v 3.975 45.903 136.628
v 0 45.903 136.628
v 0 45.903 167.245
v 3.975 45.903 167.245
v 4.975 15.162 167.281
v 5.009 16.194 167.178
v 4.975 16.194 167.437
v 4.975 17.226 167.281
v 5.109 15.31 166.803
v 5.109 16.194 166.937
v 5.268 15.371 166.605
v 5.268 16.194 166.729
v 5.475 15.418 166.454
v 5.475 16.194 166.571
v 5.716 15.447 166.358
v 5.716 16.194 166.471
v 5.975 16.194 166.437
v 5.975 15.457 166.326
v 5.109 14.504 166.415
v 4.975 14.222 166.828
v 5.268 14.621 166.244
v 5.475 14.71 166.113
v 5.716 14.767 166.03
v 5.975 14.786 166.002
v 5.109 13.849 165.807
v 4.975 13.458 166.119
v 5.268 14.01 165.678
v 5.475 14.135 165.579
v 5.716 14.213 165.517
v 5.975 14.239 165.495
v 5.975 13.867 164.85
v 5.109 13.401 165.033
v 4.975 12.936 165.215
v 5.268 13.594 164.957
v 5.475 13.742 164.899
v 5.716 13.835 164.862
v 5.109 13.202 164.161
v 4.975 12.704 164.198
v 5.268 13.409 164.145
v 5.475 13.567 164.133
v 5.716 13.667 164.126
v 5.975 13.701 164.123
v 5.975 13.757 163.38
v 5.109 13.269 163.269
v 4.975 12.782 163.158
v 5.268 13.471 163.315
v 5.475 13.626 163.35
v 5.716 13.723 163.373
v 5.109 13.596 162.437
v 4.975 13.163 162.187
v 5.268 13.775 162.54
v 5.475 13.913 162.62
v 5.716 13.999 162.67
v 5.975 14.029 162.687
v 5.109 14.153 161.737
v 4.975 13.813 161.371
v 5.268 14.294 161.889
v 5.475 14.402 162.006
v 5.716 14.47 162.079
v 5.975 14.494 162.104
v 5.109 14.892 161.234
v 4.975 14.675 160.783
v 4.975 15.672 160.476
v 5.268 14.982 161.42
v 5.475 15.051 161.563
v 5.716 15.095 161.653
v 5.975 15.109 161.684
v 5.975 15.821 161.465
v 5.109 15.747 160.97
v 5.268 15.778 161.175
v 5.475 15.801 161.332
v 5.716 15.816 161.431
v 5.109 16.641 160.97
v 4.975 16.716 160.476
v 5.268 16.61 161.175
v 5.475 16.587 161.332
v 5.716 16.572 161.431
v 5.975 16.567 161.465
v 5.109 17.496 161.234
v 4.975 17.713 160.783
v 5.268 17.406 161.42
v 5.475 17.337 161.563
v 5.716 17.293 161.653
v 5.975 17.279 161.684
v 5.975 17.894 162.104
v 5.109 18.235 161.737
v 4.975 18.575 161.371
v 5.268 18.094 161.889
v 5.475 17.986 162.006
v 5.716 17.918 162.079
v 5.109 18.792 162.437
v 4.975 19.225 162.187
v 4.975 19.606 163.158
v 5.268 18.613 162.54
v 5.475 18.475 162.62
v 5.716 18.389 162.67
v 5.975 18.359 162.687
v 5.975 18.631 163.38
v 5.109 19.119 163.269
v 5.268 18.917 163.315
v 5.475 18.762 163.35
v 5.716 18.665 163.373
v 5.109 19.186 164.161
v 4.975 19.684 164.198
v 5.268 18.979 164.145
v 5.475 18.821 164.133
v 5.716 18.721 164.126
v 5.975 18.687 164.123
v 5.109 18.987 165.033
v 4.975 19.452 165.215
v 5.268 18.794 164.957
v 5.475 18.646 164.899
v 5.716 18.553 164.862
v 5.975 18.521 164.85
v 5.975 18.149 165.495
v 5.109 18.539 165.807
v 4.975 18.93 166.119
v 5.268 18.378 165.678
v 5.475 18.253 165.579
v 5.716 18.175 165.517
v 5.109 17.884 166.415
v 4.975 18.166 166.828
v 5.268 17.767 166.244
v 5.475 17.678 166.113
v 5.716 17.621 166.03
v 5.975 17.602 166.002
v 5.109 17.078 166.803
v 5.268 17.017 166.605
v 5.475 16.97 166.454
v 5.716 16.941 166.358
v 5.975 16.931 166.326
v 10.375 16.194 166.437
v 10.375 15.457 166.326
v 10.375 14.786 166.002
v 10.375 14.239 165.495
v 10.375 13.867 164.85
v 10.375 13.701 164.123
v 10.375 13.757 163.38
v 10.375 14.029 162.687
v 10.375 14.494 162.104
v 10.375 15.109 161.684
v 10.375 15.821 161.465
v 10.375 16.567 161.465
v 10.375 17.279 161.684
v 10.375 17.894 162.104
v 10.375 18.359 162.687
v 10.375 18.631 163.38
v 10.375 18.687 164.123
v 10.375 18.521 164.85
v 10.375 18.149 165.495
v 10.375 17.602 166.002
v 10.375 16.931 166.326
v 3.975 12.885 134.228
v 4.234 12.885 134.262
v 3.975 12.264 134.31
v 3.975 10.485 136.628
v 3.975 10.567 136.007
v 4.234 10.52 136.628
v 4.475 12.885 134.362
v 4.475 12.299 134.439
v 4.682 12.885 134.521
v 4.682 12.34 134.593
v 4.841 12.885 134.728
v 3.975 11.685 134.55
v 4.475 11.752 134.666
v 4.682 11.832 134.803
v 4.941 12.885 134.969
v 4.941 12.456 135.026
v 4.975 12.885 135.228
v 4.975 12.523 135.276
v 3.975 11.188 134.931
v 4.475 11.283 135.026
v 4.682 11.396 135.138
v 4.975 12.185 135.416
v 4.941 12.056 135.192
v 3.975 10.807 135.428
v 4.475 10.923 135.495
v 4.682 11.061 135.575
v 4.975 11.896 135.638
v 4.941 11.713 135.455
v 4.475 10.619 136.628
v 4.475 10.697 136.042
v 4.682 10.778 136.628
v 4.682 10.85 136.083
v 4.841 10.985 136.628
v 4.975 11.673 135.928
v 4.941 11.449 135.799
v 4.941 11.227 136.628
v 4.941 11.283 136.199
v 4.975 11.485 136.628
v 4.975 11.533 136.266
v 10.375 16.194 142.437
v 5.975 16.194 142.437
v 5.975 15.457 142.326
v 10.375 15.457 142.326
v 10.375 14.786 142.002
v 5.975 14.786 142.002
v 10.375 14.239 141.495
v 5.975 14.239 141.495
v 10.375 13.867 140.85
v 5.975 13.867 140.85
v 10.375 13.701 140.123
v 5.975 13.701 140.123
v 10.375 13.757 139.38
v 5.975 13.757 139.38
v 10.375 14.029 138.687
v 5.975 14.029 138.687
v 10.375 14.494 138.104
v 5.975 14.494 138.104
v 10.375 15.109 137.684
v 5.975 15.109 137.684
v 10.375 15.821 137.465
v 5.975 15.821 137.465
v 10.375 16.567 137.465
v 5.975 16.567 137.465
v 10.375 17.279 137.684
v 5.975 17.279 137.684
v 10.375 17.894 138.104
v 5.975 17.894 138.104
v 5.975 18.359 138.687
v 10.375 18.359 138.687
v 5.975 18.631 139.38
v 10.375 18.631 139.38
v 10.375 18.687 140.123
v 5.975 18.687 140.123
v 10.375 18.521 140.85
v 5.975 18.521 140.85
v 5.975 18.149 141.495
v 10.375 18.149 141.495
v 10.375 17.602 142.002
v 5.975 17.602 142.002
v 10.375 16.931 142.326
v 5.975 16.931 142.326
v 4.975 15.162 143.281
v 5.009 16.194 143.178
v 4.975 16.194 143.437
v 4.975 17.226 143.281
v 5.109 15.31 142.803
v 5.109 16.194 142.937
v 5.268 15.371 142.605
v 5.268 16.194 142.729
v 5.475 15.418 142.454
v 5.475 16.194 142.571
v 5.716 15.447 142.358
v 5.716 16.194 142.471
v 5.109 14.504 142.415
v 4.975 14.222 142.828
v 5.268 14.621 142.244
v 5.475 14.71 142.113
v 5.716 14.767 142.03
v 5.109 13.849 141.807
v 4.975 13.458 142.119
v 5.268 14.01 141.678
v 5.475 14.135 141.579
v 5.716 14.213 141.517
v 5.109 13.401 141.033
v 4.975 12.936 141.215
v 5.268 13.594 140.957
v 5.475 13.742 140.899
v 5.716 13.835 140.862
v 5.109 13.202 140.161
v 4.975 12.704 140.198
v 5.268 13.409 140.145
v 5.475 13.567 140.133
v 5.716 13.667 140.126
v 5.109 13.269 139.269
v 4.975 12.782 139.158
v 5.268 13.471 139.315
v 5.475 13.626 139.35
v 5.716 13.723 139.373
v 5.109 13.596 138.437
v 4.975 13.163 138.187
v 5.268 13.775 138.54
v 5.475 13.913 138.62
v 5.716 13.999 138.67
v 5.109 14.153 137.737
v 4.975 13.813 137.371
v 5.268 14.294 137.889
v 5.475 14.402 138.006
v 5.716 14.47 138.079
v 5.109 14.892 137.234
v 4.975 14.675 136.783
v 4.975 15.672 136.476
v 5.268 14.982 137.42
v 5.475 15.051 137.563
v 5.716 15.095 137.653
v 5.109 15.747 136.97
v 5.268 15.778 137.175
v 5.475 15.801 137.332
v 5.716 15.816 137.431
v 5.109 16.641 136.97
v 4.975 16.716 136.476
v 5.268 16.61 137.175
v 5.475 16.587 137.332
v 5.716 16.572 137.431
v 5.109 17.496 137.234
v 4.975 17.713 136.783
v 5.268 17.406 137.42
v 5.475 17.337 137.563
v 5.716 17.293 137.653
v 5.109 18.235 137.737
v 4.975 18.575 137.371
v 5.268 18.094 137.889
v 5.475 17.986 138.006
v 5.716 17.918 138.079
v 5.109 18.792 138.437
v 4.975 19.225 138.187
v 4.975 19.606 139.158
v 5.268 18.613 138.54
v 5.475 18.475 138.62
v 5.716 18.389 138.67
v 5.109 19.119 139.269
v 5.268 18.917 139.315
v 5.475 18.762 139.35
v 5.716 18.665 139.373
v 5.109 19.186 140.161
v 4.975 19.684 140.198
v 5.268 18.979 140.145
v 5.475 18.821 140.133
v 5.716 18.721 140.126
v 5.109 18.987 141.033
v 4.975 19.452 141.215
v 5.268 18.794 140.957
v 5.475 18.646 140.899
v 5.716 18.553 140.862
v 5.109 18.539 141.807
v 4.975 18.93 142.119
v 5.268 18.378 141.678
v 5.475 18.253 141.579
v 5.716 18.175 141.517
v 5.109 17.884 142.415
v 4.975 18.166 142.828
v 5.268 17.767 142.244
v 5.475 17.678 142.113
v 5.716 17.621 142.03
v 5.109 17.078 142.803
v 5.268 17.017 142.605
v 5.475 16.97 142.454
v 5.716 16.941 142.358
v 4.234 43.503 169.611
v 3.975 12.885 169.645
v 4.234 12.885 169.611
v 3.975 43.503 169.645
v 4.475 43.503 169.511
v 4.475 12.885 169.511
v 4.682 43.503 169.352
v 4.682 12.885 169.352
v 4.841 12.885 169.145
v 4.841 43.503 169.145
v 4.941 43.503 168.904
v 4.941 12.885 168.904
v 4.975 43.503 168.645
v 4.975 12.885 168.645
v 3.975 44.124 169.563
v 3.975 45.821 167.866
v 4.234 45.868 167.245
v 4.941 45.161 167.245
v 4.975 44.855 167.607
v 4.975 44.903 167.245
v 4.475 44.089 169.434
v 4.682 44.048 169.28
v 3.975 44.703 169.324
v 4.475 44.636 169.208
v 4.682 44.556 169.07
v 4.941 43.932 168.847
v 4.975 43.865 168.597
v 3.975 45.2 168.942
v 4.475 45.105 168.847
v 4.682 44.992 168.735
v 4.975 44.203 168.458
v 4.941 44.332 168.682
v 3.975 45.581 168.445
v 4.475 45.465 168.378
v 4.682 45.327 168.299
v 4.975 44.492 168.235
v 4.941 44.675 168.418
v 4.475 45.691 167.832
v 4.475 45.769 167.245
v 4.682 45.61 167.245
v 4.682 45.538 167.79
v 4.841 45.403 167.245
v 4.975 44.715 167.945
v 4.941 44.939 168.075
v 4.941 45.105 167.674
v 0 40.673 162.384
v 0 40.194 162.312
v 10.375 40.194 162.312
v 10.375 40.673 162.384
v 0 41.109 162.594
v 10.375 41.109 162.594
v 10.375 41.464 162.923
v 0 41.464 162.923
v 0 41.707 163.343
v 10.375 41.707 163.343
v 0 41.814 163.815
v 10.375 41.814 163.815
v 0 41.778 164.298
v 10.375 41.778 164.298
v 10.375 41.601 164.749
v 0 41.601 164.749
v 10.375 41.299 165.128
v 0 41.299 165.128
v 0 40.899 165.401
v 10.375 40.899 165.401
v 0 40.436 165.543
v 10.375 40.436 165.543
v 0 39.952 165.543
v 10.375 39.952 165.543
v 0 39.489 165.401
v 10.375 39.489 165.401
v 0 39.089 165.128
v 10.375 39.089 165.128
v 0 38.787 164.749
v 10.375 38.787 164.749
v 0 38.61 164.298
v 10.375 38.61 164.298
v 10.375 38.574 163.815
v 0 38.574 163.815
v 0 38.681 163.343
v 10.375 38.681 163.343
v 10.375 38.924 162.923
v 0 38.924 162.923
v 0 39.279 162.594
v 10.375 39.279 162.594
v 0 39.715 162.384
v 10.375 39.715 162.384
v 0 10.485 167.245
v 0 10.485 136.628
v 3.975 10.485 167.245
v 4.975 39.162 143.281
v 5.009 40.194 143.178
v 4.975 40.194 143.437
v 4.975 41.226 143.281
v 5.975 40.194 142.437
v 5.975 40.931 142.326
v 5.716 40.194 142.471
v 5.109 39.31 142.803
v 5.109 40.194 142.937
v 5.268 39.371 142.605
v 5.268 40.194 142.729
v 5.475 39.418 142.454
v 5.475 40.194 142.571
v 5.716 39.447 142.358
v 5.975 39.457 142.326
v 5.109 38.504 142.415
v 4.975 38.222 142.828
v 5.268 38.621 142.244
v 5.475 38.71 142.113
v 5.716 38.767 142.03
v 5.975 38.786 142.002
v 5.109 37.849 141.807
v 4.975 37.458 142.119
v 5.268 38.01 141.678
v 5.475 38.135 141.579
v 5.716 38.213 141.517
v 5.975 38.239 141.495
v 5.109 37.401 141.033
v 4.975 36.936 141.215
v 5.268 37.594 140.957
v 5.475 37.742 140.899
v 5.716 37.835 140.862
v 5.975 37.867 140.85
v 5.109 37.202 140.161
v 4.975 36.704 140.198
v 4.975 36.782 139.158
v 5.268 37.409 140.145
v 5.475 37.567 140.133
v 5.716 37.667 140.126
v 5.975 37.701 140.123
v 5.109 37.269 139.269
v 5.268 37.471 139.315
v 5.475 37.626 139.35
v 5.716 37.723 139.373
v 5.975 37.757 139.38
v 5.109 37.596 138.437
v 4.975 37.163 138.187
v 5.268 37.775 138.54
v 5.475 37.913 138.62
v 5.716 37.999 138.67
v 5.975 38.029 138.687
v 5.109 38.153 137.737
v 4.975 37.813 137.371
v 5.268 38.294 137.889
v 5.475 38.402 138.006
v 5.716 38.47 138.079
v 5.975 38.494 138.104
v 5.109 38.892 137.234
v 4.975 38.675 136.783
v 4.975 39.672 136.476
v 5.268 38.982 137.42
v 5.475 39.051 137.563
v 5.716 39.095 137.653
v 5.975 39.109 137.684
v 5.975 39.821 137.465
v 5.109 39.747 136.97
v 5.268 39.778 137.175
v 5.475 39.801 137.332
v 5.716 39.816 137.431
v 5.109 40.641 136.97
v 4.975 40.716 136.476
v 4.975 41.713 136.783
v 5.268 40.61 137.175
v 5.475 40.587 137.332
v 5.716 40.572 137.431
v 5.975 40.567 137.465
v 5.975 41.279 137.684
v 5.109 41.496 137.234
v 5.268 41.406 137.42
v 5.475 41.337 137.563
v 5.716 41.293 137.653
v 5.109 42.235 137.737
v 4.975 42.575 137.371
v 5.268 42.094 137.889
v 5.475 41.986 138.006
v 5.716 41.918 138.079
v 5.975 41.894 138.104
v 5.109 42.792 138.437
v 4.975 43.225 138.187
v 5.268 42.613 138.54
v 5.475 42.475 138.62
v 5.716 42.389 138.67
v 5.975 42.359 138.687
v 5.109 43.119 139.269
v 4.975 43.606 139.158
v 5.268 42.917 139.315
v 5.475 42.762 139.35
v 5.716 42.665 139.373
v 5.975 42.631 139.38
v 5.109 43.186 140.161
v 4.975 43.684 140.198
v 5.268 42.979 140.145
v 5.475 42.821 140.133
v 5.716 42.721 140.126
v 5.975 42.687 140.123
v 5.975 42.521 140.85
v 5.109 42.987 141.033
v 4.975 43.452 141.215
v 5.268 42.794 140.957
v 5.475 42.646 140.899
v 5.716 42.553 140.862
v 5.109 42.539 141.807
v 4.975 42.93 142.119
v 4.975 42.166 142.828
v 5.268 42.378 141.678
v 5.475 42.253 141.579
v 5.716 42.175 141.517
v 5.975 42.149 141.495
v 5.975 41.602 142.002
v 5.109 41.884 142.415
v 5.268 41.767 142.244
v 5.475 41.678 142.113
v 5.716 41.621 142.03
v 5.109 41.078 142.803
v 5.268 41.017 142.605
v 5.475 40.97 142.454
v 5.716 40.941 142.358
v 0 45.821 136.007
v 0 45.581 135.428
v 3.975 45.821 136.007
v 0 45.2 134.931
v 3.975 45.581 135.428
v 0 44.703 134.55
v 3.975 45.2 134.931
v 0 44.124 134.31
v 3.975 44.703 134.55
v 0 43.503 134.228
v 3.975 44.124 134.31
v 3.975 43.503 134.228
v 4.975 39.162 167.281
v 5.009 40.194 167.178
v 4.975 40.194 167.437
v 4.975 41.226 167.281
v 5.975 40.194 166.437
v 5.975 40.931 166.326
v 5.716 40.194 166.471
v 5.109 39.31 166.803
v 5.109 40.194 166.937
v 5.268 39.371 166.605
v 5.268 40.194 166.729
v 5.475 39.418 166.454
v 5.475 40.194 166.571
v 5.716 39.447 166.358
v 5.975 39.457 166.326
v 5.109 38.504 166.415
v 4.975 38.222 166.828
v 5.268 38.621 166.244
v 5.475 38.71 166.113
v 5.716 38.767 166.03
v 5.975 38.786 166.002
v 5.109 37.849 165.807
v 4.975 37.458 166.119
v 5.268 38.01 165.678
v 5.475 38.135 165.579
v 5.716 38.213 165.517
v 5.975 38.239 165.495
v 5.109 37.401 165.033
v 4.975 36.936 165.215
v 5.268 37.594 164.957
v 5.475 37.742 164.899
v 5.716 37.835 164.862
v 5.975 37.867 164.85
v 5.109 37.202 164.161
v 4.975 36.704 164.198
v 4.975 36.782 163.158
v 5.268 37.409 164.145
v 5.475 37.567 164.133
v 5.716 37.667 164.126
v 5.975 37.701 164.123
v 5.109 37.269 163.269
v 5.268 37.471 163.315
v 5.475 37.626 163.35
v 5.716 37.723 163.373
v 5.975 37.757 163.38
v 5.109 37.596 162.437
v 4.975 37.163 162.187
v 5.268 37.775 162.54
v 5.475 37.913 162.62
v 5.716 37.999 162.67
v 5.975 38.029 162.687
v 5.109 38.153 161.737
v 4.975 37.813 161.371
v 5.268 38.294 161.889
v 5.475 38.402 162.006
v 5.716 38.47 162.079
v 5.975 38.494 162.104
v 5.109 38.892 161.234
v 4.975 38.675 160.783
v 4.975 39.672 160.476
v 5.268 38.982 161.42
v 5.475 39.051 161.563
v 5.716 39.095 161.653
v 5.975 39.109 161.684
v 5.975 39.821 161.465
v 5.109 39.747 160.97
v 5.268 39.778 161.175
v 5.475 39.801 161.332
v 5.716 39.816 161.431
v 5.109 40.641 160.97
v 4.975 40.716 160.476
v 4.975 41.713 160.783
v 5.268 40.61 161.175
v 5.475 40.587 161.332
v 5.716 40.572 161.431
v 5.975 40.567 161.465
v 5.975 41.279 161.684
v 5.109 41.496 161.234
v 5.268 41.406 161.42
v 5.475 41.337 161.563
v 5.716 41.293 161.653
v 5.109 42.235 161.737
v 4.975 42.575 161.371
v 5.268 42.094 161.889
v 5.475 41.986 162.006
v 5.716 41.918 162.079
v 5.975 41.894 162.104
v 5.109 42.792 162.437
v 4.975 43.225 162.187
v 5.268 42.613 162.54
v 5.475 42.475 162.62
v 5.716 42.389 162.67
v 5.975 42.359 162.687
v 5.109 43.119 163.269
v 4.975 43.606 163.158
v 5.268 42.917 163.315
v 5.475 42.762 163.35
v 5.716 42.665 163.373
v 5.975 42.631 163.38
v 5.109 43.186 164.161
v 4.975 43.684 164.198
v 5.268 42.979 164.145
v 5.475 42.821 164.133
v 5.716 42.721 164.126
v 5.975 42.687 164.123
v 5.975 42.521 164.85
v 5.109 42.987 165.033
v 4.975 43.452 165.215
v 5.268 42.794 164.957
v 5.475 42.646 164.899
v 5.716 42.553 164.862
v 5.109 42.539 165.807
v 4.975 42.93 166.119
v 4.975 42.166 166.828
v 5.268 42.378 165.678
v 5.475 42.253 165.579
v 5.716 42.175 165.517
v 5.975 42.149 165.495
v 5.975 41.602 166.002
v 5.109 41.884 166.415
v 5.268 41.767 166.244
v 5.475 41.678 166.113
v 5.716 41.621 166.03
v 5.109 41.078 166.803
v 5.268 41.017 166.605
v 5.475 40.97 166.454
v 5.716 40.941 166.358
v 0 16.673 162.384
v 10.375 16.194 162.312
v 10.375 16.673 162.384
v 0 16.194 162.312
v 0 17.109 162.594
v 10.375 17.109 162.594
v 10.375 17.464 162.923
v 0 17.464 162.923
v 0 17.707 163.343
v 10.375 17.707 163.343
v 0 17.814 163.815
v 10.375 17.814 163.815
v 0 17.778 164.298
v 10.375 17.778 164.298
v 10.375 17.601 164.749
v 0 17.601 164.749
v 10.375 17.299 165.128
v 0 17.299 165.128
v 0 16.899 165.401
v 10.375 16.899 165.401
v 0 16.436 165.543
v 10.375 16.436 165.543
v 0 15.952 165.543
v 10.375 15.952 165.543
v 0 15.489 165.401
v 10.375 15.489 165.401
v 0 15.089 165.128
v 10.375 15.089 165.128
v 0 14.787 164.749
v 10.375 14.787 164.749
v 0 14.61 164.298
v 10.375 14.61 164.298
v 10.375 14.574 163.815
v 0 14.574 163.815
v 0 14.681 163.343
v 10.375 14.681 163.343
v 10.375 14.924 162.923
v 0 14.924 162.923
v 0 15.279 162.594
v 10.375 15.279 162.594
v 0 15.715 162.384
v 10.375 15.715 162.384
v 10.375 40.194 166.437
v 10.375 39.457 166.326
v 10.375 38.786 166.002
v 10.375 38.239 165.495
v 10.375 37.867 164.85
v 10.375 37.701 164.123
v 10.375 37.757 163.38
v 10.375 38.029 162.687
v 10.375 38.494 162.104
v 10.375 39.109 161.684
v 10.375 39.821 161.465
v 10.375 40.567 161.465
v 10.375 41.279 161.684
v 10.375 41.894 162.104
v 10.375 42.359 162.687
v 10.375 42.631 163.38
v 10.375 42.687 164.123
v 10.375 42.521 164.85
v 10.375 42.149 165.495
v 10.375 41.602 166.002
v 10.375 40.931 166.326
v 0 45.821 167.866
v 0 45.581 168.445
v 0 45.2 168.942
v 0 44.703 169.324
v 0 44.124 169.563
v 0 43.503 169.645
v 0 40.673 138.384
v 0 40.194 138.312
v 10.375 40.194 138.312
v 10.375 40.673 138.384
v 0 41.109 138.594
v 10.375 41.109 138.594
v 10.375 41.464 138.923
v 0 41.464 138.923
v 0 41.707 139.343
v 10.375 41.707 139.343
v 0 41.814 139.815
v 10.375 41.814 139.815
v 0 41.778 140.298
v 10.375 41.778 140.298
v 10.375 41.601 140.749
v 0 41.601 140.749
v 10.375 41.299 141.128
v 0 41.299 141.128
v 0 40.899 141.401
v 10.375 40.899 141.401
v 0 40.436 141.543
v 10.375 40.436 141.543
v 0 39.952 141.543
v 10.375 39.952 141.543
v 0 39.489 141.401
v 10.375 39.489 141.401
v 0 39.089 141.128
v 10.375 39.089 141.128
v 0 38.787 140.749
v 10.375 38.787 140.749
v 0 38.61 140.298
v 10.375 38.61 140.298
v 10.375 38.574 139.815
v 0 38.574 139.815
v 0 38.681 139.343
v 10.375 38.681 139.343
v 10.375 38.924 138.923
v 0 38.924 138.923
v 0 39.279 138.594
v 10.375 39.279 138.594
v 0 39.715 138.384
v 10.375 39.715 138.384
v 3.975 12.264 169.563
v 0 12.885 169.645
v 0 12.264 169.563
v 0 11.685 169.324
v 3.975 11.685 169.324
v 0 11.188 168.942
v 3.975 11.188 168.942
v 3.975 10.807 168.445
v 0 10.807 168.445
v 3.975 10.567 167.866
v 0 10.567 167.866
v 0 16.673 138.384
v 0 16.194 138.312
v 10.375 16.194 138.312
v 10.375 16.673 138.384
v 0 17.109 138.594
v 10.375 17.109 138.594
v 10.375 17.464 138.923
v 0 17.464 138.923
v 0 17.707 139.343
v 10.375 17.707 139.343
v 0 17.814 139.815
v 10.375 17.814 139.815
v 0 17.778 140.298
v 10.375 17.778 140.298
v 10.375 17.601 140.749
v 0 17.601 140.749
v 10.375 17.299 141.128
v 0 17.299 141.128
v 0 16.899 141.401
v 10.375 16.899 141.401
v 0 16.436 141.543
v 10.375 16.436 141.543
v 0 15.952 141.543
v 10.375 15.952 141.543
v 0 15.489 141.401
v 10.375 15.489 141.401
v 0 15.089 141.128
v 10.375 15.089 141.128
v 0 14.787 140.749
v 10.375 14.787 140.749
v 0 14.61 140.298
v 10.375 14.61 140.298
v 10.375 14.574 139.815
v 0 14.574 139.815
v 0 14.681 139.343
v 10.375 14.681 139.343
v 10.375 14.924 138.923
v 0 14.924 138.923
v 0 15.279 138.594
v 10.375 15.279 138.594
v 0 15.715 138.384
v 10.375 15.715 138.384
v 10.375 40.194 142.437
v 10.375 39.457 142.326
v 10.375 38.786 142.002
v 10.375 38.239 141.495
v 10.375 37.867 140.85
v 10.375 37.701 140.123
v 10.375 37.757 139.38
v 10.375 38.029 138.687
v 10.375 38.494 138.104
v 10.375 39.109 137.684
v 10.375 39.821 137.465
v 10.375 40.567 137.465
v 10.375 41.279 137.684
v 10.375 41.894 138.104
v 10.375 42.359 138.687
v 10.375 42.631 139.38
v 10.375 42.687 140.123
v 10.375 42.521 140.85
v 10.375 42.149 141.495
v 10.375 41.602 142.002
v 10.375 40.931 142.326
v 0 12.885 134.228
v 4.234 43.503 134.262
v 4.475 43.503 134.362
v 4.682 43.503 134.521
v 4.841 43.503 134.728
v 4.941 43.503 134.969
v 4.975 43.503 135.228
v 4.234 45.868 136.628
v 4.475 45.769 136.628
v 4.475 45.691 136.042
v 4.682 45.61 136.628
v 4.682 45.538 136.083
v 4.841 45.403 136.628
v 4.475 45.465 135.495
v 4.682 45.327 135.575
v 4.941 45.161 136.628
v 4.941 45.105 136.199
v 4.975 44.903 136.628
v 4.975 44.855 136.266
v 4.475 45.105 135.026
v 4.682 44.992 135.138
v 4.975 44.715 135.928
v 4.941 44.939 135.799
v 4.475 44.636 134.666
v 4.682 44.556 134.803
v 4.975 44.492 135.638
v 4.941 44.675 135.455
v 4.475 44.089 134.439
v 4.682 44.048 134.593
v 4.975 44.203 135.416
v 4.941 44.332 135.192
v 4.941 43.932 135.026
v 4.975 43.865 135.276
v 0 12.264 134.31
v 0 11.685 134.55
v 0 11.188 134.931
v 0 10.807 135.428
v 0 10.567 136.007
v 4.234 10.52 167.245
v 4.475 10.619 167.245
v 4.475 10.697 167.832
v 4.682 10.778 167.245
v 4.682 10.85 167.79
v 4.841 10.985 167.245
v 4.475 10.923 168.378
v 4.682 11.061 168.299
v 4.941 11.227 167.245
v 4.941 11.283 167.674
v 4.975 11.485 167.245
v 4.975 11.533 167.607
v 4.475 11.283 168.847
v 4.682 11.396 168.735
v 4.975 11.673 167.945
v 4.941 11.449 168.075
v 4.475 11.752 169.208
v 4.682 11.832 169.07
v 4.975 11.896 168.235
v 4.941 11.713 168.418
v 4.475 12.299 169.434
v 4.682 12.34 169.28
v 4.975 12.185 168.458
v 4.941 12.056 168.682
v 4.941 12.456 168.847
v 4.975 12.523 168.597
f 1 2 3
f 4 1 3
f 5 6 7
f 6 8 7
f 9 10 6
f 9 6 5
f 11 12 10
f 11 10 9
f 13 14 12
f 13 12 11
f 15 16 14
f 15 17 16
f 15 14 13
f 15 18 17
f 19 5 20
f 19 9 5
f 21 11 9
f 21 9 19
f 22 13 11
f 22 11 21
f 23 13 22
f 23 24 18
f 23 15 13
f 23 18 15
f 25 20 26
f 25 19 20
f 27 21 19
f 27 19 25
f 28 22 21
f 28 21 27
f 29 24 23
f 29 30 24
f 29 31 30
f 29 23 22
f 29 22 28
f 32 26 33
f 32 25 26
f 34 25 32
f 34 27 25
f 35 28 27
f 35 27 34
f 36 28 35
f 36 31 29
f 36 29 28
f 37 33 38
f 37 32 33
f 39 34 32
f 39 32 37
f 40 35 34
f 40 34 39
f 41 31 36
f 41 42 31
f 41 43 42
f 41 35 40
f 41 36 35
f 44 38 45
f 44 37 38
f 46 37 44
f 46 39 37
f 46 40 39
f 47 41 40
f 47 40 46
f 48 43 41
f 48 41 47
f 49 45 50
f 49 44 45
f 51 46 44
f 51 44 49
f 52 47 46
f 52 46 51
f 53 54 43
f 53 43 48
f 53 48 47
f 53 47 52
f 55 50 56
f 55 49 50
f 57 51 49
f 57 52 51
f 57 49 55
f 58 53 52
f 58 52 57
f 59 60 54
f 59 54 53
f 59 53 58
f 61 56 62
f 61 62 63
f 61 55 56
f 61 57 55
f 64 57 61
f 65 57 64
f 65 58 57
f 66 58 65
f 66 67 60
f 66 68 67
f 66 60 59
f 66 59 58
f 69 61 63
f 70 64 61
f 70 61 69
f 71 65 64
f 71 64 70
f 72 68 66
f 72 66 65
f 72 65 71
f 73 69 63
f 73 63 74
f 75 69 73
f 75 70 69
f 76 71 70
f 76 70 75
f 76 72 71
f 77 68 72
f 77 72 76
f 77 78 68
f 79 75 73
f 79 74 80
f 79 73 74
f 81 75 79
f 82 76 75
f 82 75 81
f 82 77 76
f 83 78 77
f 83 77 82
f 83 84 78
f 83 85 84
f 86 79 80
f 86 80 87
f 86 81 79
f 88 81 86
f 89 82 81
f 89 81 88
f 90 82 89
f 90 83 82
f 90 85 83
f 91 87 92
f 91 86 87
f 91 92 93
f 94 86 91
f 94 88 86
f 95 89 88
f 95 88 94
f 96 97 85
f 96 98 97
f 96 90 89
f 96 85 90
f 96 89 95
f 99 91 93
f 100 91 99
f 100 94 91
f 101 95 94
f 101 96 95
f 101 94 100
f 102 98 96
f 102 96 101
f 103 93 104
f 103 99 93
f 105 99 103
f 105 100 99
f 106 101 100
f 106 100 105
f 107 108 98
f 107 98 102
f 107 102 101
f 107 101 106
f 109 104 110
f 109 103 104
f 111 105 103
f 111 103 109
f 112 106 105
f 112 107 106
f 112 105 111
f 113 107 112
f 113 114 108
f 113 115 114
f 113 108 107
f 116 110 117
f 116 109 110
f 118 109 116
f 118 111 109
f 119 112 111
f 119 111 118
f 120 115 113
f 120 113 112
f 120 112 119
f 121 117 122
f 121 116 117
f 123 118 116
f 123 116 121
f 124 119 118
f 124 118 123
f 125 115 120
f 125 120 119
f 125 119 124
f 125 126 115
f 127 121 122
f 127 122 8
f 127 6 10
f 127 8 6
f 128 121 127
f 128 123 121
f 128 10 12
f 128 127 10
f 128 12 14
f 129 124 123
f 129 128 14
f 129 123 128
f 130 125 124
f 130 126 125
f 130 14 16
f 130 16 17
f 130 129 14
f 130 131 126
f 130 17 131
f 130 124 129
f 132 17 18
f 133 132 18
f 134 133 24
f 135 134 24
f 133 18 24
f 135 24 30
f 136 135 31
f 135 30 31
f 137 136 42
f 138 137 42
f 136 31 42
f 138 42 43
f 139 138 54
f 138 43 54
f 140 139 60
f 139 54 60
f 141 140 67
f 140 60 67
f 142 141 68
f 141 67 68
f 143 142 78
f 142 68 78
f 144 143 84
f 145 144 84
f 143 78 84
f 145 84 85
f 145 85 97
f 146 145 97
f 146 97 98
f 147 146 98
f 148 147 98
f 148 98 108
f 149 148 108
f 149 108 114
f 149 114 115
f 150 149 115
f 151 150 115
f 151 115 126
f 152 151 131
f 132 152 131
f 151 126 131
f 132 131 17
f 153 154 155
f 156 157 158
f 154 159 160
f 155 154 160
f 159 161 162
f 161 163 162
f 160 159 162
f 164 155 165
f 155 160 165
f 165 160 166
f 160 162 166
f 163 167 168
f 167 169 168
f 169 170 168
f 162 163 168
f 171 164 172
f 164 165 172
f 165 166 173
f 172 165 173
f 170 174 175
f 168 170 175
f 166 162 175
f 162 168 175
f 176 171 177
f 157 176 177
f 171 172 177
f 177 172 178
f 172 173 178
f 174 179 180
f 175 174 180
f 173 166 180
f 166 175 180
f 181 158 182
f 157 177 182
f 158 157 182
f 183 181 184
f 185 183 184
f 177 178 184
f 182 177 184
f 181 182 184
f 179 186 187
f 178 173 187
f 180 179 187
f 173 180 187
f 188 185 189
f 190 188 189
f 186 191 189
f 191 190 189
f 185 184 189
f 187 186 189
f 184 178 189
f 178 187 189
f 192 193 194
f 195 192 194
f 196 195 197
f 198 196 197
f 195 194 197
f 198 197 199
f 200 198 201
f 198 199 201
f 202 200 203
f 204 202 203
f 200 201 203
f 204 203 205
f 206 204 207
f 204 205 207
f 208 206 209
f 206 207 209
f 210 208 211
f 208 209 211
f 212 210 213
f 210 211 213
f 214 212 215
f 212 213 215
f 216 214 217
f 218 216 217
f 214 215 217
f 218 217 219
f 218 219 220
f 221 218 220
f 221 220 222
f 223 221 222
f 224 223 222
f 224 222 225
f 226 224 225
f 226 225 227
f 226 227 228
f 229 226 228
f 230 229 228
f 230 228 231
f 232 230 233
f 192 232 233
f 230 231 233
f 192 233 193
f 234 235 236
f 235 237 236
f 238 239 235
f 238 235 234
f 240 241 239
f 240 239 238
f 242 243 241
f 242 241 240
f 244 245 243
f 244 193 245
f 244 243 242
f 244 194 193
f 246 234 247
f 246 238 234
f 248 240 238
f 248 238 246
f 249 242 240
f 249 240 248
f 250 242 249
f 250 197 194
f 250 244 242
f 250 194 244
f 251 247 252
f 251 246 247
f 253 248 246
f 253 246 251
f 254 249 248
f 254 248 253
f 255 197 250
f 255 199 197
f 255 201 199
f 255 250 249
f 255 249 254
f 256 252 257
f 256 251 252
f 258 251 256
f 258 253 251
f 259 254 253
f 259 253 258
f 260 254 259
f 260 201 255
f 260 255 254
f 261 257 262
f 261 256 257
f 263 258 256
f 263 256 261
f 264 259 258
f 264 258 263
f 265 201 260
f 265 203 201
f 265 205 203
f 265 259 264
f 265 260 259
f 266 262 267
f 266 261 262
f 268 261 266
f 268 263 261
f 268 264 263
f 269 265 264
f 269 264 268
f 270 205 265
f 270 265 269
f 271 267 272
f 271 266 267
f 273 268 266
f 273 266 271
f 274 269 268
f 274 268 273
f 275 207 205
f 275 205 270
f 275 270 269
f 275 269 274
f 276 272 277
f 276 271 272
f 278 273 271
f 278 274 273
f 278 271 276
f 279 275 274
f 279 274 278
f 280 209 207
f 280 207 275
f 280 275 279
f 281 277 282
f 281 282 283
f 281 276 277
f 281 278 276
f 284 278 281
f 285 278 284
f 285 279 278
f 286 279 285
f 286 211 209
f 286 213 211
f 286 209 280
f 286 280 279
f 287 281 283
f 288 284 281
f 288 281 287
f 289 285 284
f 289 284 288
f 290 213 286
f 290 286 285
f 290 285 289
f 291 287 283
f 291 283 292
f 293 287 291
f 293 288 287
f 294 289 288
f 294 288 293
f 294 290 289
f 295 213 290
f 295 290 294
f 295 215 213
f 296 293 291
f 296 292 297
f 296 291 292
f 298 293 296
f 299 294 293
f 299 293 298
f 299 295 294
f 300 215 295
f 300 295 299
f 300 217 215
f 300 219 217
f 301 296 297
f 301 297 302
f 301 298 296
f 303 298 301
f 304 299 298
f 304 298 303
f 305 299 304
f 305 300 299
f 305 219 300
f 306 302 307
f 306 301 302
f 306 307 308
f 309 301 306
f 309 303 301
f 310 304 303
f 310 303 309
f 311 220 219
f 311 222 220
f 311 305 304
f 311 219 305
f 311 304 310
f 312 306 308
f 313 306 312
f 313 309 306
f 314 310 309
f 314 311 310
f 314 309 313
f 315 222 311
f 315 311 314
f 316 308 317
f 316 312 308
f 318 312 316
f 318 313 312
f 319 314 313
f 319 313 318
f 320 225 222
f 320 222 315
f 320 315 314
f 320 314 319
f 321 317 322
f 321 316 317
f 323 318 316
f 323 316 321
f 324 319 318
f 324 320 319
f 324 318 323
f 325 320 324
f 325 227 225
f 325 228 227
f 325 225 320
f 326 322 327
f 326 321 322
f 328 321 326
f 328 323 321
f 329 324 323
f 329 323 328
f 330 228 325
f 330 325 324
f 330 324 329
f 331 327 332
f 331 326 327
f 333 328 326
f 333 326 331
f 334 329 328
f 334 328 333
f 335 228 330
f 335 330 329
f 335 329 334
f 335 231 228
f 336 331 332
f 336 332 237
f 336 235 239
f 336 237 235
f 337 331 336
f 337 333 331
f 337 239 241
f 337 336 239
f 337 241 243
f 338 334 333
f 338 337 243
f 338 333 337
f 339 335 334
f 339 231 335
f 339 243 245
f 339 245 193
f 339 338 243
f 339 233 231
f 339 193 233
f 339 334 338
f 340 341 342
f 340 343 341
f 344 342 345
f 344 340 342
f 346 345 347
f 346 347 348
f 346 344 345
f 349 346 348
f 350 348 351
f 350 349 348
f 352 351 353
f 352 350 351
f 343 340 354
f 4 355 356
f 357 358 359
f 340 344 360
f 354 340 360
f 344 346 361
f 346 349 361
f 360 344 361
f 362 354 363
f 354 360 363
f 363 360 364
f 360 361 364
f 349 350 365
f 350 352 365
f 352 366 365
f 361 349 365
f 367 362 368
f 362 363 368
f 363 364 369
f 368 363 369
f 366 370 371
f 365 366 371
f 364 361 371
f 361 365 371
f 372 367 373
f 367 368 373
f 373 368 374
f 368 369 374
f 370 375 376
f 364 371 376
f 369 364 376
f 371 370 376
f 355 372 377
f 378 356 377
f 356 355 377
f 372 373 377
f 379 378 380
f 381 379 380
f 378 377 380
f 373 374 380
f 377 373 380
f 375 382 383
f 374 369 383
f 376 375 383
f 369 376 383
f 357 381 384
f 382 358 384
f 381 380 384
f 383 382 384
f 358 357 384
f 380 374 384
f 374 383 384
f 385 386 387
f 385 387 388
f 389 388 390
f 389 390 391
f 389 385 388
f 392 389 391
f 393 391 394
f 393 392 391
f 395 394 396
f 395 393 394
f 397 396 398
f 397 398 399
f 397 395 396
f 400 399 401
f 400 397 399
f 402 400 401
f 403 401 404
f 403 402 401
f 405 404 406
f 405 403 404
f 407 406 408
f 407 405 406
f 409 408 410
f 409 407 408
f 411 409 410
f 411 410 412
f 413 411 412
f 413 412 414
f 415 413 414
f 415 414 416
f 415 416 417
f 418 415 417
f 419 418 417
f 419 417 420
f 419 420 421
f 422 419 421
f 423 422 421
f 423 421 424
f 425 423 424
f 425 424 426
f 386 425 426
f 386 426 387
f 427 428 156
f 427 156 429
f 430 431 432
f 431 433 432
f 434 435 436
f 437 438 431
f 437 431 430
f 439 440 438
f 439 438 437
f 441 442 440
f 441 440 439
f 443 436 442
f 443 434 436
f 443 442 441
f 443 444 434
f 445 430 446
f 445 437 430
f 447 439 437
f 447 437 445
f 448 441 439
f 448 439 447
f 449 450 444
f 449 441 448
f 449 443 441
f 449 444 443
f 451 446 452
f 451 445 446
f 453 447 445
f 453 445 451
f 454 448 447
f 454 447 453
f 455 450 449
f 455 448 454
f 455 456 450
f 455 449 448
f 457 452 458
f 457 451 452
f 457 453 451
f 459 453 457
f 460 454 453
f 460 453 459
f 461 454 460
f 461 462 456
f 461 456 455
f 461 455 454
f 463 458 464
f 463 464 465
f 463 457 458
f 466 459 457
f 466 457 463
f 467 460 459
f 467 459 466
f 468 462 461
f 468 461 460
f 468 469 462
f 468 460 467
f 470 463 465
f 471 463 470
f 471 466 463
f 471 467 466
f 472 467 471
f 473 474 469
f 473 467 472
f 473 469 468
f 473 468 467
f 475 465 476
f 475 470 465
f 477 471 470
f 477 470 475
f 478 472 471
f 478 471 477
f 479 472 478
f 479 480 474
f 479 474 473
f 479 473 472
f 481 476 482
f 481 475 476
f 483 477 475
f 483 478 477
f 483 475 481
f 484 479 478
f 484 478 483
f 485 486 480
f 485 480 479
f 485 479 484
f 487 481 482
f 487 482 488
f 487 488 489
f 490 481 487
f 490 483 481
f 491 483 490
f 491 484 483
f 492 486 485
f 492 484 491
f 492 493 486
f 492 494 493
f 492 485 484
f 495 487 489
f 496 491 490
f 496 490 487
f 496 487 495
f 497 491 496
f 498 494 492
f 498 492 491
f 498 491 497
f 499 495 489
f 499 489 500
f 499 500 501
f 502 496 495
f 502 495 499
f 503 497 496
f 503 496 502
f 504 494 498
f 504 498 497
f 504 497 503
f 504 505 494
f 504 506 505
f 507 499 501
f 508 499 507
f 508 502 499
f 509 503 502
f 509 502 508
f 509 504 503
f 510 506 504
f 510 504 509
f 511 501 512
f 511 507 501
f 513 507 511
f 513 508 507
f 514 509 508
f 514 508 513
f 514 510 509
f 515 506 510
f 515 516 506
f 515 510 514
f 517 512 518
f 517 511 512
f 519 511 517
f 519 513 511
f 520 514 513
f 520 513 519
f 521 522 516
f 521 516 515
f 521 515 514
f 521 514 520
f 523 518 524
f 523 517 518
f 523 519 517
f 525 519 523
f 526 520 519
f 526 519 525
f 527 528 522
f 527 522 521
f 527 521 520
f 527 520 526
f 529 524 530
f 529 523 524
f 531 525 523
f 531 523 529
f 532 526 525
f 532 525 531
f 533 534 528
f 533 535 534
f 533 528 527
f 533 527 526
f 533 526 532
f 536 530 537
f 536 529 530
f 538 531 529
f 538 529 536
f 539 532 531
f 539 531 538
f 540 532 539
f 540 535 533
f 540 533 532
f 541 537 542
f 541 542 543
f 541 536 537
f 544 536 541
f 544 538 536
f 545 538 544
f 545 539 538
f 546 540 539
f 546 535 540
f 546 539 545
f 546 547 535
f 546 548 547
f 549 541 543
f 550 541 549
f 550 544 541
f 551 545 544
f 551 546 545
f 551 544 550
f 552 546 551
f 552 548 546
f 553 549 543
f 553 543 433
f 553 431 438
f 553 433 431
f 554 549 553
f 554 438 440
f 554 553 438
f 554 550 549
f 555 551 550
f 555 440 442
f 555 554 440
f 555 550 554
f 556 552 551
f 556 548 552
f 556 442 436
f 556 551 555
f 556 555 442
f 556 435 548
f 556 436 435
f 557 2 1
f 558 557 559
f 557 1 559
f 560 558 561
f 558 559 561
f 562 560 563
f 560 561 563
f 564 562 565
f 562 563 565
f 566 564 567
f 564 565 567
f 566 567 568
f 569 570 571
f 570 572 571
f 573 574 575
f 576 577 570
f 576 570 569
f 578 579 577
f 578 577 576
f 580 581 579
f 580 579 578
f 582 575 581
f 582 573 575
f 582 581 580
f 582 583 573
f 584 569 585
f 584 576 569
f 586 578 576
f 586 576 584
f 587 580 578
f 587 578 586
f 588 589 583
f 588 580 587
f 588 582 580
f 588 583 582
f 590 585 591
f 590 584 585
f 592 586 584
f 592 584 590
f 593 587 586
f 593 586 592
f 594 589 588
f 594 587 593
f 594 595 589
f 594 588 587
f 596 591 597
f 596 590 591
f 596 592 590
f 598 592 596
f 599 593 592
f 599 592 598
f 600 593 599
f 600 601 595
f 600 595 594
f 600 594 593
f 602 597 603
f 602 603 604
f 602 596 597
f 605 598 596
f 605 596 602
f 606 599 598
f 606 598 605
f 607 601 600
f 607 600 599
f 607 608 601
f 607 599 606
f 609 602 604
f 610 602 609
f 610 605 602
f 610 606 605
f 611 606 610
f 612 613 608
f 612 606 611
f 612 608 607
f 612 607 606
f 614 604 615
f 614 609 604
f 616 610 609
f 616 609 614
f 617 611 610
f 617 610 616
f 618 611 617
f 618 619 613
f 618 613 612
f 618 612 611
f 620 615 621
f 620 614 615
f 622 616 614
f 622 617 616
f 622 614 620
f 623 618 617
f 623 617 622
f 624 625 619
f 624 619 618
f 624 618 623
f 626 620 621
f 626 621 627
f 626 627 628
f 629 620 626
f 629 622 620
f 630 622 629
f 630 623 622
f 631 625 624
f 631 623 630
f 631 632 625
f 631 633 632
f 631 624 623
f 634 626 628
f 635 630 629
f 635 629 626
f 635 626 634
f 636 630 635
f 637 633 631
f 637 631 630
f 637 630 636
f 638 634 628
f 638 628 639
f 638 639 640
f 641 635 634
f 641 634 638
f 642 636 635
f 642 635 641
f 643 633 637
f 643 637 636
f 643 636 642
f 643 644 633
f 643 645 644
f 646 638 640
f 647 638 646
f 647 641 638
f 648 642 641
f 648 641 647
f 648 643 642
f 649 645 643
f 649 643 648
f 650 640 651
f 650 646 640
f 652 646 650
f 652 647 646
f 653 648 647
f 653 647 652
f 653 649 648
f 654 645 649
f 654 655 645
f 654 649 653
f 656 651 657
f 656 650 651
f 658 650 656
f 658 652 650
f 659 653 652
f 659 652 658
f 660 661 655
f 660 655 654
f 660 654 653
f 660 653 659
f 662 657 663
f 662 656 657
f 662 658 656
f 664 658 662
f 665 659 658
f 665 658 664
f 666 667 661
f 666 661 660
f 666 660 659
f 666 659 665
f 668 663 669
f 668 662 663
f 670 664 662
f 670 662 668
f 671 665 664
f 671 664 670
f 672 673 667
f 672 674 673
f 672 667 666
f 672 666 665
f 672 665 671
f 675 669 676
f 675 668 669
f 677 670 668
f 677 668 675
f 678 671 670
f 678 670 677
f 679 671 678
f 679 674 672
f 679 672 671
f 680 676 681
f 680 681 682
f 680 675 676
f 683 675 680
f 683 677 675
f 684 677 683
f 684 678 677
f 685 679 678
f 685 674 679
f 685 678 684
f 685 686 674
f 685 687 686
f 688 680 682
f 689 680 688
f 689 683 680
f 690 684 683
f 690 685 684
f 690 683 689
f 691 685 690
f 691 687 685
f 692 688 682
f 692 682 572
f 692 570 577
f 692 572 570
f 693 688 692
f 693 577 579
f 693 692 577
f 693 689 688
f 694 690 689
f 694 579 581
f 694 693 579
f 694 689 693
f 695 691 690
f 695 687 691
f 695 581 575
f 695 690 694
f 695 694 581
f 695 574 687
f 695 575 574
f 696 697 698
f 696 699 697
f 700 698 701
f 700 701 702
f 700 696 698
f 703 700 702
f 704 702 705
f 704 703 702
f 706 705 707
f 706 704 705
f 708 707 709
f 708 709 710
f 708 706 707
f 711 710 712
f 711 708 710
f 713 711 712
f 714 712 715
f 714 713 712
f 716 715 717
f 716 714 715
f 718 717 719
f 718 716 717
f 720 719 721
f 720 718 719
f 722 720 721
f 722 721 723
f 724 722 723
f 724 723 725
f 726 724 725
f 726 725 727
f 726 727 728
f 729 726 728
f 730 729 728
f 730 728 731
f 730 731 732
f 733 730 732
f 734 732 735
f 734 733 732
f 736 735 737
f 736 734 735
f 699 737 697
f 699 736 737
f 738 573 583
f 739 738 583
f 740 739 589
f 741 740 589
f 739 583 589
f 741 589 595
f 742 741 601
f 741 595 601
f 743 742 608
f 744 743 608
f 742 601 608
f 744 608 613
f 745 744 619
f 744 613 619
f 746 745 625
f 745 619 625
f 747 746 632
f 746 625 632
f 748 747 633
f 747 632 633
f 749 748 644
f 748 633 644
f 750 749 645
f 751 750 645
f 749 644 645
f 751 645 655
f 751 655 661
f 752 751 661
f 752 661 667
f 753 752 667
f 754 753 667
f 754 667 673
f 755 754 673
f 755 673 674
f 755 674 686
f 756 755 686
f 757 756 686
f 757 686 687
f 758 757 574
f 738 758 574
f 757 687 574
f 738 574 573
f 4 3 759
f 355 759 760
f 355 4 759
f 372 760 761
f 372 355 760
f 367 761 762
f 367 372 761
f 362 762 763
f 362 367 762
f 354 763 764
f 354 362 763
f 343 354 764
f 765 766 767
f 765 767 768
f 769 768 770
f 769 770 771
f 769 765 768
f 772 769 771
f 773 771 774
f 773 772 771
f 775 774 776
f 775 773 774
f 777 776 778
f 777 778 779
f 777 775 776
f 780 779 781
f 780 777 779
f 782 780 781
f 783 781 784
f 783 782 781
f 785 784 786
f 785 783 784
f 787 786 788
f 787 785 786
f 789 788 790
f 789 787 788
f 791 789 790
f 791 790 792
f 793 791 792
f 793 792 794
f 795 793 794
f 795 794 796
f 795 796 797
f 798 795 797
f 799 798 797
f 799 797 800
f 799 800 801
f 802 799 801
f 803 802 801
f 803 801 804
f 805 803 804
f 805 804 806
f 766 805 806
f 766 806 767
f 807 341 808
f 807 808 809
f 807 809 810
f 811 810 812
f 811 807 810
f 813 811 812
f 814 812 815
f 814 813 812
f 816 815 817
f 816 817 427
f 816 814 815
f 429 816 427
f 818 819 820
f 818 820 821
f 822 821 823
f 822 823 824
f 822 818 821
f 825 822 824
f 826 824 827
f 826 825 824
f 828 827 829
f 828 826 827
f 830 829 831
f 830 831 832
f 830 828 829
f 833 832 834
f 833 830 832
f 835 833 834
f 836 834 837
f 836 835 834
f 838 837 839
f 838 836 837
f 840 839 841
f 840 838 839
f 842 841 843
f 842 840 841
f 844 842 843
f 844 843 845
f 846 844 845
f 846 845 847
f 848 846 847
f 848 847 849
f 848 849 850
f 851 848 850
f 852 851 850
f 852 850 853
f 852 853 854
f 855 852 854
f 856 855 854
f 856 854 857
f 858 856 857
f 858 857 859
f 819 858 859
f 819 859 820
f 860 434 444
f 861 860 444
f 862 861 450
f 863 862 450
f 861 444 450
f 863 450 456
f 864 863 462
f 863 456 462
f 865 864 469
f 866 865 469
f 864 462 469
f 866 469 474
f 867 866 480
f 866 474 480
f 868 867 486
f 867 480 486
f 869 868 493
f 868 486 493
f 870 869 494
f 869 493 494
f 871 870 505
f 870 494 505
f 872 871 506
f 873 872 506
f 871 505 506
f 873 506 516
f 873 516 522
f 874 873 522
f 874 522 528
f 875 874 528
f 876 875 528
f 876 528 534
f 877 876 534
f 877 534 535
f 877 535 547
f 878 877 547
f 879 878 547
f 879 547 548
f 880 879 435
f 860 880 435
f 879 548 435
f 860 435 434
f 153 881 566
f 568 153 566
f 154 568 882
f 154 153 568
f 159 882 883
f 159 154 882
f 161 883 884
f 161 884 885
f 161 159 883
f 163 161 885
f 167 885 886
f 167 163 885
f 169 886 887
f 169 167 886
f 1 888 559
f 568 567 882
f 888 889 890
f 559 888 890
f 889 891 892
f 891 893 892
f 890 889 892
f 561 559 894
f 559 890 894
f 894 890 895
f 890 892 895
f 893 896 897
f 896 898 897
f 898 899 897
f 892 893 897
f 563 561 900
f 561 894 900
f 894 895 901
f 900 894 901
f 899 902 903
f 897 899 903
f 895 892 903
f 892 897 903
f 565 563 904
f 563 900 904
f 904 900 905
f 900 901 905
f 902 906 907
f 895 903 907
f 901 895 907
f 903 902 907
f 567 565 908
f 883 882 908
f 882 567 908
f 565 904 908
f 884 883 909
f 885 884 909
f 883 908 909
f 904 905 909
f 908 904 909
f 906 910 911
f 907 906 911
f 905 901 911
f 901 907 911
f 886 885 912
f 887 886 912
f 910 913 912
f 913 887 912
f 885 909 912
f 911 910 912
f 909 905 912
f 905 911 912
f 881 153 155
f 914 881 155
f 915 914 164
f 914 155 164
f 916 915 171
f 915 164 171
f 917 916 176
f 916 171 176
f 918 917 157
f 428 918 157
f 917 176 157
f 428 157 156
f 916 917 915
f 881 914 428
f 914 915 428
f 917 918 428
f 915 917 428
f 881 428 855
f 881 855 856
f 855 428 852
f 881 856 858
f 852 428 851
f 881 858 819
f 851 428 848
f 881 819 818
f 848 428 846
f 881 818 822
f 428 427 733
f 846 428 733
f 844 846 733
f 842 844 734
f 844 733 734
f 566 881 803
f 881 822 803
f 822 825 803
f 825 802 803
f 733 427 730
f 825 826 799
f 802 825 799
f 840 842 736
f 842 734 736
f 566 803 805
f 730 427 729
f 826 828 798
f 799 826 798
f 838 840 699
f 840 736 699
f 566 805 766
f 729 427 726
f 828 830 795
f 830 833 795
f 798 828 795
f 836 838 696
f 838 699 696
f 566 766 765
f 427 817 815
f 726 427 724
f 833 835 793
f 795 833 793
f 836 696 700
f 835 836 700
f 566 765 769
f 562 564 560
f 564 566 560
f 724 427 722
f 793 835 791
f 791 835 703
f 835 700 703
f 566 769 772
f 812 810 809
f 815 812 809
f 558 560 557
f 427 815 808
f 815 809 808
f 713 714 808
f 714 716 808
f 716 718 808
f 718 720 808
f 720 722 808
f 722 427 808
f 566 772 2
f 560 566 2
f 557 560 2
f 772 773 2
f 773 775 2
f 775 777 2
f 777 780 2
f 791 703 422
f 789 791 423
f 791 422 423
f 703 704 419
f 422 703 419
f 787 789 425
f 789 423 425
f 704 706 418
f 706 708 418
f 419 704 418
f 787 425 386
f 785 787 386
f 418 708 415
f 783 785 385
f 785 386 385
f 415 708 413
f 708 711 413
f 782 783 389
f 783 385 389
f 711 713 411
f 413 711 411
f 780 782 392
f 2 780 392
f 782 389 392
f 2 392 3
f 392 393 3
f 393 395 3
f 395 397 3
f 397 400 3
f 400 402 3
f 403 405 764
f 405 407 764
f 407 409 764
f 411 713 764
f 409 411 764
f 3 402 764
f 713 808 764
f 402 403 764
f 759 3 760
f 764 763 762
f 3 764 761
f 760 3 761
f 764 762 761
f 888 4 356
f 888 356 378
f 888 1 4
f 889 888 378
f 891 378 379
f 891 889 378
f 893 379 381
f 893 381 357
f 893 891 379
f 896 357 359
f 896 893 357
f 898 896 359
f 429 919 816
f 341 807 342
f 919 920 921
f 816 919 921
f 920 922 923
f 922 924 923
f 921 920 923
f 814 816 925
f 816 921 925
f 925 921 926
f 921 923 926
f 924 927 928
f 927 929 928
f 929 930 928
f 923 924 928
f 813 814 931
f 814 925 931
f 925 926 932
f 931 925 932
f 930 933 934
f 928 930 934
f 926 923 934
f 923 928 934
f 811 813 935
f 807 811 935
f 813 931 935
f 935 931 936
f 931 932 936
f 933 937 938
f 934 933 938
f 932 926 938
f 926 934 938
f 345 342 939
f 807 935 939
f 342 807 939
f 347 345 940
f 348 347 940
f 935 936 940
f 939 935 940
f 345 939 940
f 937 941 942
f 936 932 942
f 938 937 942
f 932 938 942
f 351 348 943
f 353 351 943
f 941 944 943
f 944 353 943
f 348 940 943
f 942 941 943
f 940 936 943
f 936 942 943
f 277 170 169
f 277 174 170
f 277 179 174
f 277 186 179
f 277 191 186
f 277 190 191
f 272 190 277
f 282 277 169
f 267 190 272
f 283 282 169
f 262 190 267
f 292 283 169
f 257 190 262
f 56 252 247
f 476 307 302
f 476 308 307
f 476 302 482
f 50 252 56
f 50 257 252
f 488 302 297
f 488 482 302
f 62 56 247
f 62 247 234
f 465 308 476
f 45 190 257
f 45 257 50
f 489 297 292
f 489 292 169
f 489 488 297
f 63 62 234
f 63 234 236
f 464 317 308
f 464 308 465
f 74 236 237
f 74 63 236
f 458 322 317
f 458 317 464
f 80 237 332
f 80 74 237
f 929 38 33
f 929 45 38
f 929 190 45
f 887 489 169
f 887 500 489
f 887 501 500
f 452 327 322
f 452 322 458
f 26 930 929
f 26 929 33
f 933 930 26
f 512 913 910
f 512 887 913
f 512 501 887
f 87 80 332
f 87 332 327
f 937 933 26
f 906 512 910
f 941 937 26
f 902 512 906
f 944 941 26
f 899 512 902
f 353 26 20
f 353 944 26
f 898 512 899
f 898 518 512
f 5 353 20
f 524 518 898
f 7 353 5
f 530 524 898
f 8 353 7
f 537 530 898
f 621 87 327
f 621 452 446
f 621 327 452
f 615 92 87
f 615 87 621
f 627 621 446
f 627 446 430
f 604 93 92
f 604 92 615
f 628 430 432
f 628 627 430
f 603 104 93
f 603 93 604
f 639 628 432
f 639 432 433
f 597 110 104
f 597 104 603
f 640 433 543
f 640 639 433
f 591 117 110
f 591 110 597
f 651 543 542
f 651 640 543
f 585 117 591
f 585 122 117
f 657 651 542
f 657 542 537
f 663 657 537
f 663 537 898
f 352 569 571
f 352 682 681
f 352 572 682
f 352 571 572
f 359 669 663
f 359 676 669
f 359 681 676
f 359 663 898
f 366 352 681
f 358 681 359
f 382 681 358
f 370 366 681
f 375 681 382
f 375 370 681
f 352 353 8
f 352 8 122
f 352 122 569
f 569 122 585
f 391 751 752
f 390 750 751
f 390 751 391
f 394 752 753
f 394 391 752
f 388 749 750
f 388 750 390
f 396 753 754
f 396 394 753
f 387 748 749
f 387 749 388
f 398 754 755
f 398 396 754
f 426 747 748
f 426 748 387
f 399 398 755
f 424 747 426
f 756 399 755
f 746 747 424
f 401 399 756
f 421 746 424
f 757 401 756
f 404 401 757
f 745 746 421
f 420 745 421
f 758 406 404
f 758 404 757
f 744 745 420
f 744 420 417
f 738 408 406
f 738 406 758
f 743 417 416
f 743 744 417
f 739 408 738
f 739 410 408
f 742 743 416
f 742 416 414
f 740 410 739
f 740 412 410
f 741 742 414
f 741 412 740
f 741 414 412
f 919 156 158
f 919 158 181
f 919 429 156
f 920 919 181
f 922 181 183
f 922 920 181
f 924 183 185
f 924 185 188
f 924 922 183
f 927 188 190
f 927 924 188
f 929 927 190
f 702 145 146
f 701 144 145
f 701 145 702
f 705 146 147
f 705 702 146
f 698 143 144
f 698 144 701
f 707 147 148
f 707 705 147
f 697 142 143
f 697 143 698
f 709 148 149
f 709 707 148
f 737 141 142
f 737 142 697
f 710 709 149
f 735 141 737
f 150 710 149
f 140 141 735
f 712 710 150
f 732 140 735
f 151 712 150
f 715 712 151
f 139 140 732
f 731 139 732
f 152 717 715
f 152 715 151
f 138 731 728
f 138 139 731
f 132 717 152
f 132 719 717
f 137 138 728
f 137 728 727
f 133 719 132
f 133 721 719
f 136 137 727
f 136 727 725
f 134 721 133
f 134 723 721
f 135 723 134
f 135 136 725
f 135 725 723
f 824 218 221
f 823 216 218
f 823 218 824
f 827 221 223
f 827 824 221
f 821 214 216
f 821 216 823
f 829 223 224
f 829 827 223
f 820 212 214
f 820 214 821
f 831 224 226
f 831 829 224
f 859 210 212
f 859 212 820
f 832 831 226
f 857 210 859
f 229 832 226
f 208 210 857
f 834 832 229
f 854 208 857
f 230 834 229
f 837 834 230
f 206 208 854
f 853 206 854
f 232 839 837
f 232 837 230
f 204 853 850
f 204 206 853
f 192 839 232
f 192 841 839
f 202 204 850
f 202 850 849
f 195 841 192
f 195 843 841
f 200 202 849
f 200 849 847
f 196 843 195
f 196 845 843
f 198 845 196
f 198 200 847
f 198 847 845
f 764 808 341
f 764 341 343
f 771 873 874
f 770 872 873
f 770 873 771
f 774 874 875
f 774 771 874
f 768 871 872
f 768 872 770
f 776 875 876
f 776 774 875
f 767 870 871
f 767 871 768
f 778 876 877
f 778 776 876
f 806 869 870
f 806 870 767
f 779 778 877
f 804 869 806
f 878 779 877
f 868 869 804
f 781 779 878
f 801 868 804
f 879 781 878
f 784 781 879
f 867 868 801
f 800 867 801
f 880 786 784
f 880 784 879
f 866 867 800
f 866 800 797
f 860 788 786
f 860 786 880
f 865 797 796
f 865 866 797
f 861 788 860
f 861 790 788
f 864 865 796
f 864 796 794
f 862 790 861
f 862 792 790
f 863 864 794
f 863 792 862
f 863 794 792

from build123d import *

# Parameters (mm, degrees)
SKETCH2_W           = 35.417007692
SKETCH2_H           = 35.417007691
SKETCH2_R           = 1.625
BOSS_EXTRUDE1_DEPTH = 4.975
SKETCH3_R           = 2.5
SKETCH3_R_2         = 1.625
BOSS_EXTRUDE2_DEPTH = 5.4
FILLET1_R           = 2.4
FILLET2_R           = 1


with BuildPart() as part:
    # Sketch2 → Boss-Extrude1 (new body)
    with BuildSketch(Plane.YZ):
        with Locations((28.194, 151.93658674)):
            Rectangle(SKETCH2_W, SKETCH2_H)
        with Locations(Location((16.194, 163.93658674, 0), (0, 0, 270))):
            Circle(SKETCH2_R, mode=Mode.SUBTRACT)
        with Locations(Location((40.194, 163.93658674, 0), (0, 0, 270))):
            Circle(SKETCH2_R, mode=Mode.SUBTRACT)
        with Locations(Location((40.194, 139.93658674, 0), (0, 0, 270))):
            Circle(SKETCH2_R, mode=Mode.SUBTRACT)
        with Locations(Location((16.194, 139.93658674, 0), (0, 0, 270))):
            Circle(SKETCH2_R, mode=Mode.SUBTRACT)
    extrude(amount=BOSS_EXTRUDE1_DEPTH)

    # Sketch3 → Boss-Extrude2 (add)
    # profile 1 of 4: a face of its own
    with BuildSketch(Plane.YZ.offset(4.975)):
        with Locations(Location((16.194, 163.93658674, 0), (0, 0, 90))):
            Circle(SKETCH3_R)
        with Locations(Location((16.194, 163.93658674, 0), (0, 0, 270))):
            Circle(SKETCH3_R_2, mode=Mode.SUBTRACT)
    # profile 2 of 4: a face of its own
    with BuildSketch(Plane.YZ.offset(4.975)):
        with Locations(Location((40.194, 163.93658674, 0), (0, 0, 90))):
            Circle(SKETCH3_R)
        with Locations(Location((40.194, 163.93658674, 0), (0, 0, 270))):
            Circle(SKETCH3_R_2, mode=Mode.SUBTRACT)
    # profile 3 of 4: a face of its own
    with BuildSketch(Plane.YZ.offset(4.975)):
        with Locations(Location((40.194, 139.93658674, 0), (0, 0, 90))):
            Circle(SKETCH3_R)
        with Locations(Location((40.194, 139.93658674, 0), (0, 0, 270))):
            Circle(SKETCH3_R_2, mode=Mode.SUBTRACT)
    # profile 4 of 4: a face of its own
    with BuildSketch(Plane.YZ.offset(4.975)):
        with Locations(Location((16.194, 139.93658674, 0), (0, 0, 90))):
            Circle(SKETCH3_R)
        with Locations(Location((16.194, 139.93658674, 0), (0, 0, 270))):
            Circle(SKETCH3_R_2, mode=Mode.SUBTRACT)
    extrude(amount=BOSS_EXTRUDE2_DEPTH)

    # Fillet1
    fillet1_edges = [part.edges().sort_by_distance(p)[0] for p in [
        (2.4875, 10.485496154, 169.645090586),
        (2.4875, 45.902503846, 169.645090586),
        (2.4875, 45.902503846, 134.228082895),
        (2.4875, 10.485496154, 134.228082895),
    ]]
    fillet(fillet1_edges, radius=FILLET1_R)

    # Fillet2
    fillet2_edges = [part.edges().sort_by_distance(p)[0] for p in [
        (4.975, 16.194, 161.43658674),
        (4.975, 40.194, 161.43658674),
        (4.975, 40.194, 137.43658674),
        (4.975, 16.194, 137.43658674),
        (4.975, 28.194, 169.645090586),
        (4.975, 45.902503846, 151.93658674),
        (4.975, 10.485496154, 151.93658674),
        (4.975, 28.194, 134.228082895),
        (4.975, 11.18843988, 168.942146861),
        (4.975, 11.18843988, 134.93102662),
        (4.975, 45.19956012, 134.93102662),
        (4.975, 45.19956012, 168.942146861),
    ]]
    fillet(fillet2_edges, radius=FILLET2_R)


solid = part.part
